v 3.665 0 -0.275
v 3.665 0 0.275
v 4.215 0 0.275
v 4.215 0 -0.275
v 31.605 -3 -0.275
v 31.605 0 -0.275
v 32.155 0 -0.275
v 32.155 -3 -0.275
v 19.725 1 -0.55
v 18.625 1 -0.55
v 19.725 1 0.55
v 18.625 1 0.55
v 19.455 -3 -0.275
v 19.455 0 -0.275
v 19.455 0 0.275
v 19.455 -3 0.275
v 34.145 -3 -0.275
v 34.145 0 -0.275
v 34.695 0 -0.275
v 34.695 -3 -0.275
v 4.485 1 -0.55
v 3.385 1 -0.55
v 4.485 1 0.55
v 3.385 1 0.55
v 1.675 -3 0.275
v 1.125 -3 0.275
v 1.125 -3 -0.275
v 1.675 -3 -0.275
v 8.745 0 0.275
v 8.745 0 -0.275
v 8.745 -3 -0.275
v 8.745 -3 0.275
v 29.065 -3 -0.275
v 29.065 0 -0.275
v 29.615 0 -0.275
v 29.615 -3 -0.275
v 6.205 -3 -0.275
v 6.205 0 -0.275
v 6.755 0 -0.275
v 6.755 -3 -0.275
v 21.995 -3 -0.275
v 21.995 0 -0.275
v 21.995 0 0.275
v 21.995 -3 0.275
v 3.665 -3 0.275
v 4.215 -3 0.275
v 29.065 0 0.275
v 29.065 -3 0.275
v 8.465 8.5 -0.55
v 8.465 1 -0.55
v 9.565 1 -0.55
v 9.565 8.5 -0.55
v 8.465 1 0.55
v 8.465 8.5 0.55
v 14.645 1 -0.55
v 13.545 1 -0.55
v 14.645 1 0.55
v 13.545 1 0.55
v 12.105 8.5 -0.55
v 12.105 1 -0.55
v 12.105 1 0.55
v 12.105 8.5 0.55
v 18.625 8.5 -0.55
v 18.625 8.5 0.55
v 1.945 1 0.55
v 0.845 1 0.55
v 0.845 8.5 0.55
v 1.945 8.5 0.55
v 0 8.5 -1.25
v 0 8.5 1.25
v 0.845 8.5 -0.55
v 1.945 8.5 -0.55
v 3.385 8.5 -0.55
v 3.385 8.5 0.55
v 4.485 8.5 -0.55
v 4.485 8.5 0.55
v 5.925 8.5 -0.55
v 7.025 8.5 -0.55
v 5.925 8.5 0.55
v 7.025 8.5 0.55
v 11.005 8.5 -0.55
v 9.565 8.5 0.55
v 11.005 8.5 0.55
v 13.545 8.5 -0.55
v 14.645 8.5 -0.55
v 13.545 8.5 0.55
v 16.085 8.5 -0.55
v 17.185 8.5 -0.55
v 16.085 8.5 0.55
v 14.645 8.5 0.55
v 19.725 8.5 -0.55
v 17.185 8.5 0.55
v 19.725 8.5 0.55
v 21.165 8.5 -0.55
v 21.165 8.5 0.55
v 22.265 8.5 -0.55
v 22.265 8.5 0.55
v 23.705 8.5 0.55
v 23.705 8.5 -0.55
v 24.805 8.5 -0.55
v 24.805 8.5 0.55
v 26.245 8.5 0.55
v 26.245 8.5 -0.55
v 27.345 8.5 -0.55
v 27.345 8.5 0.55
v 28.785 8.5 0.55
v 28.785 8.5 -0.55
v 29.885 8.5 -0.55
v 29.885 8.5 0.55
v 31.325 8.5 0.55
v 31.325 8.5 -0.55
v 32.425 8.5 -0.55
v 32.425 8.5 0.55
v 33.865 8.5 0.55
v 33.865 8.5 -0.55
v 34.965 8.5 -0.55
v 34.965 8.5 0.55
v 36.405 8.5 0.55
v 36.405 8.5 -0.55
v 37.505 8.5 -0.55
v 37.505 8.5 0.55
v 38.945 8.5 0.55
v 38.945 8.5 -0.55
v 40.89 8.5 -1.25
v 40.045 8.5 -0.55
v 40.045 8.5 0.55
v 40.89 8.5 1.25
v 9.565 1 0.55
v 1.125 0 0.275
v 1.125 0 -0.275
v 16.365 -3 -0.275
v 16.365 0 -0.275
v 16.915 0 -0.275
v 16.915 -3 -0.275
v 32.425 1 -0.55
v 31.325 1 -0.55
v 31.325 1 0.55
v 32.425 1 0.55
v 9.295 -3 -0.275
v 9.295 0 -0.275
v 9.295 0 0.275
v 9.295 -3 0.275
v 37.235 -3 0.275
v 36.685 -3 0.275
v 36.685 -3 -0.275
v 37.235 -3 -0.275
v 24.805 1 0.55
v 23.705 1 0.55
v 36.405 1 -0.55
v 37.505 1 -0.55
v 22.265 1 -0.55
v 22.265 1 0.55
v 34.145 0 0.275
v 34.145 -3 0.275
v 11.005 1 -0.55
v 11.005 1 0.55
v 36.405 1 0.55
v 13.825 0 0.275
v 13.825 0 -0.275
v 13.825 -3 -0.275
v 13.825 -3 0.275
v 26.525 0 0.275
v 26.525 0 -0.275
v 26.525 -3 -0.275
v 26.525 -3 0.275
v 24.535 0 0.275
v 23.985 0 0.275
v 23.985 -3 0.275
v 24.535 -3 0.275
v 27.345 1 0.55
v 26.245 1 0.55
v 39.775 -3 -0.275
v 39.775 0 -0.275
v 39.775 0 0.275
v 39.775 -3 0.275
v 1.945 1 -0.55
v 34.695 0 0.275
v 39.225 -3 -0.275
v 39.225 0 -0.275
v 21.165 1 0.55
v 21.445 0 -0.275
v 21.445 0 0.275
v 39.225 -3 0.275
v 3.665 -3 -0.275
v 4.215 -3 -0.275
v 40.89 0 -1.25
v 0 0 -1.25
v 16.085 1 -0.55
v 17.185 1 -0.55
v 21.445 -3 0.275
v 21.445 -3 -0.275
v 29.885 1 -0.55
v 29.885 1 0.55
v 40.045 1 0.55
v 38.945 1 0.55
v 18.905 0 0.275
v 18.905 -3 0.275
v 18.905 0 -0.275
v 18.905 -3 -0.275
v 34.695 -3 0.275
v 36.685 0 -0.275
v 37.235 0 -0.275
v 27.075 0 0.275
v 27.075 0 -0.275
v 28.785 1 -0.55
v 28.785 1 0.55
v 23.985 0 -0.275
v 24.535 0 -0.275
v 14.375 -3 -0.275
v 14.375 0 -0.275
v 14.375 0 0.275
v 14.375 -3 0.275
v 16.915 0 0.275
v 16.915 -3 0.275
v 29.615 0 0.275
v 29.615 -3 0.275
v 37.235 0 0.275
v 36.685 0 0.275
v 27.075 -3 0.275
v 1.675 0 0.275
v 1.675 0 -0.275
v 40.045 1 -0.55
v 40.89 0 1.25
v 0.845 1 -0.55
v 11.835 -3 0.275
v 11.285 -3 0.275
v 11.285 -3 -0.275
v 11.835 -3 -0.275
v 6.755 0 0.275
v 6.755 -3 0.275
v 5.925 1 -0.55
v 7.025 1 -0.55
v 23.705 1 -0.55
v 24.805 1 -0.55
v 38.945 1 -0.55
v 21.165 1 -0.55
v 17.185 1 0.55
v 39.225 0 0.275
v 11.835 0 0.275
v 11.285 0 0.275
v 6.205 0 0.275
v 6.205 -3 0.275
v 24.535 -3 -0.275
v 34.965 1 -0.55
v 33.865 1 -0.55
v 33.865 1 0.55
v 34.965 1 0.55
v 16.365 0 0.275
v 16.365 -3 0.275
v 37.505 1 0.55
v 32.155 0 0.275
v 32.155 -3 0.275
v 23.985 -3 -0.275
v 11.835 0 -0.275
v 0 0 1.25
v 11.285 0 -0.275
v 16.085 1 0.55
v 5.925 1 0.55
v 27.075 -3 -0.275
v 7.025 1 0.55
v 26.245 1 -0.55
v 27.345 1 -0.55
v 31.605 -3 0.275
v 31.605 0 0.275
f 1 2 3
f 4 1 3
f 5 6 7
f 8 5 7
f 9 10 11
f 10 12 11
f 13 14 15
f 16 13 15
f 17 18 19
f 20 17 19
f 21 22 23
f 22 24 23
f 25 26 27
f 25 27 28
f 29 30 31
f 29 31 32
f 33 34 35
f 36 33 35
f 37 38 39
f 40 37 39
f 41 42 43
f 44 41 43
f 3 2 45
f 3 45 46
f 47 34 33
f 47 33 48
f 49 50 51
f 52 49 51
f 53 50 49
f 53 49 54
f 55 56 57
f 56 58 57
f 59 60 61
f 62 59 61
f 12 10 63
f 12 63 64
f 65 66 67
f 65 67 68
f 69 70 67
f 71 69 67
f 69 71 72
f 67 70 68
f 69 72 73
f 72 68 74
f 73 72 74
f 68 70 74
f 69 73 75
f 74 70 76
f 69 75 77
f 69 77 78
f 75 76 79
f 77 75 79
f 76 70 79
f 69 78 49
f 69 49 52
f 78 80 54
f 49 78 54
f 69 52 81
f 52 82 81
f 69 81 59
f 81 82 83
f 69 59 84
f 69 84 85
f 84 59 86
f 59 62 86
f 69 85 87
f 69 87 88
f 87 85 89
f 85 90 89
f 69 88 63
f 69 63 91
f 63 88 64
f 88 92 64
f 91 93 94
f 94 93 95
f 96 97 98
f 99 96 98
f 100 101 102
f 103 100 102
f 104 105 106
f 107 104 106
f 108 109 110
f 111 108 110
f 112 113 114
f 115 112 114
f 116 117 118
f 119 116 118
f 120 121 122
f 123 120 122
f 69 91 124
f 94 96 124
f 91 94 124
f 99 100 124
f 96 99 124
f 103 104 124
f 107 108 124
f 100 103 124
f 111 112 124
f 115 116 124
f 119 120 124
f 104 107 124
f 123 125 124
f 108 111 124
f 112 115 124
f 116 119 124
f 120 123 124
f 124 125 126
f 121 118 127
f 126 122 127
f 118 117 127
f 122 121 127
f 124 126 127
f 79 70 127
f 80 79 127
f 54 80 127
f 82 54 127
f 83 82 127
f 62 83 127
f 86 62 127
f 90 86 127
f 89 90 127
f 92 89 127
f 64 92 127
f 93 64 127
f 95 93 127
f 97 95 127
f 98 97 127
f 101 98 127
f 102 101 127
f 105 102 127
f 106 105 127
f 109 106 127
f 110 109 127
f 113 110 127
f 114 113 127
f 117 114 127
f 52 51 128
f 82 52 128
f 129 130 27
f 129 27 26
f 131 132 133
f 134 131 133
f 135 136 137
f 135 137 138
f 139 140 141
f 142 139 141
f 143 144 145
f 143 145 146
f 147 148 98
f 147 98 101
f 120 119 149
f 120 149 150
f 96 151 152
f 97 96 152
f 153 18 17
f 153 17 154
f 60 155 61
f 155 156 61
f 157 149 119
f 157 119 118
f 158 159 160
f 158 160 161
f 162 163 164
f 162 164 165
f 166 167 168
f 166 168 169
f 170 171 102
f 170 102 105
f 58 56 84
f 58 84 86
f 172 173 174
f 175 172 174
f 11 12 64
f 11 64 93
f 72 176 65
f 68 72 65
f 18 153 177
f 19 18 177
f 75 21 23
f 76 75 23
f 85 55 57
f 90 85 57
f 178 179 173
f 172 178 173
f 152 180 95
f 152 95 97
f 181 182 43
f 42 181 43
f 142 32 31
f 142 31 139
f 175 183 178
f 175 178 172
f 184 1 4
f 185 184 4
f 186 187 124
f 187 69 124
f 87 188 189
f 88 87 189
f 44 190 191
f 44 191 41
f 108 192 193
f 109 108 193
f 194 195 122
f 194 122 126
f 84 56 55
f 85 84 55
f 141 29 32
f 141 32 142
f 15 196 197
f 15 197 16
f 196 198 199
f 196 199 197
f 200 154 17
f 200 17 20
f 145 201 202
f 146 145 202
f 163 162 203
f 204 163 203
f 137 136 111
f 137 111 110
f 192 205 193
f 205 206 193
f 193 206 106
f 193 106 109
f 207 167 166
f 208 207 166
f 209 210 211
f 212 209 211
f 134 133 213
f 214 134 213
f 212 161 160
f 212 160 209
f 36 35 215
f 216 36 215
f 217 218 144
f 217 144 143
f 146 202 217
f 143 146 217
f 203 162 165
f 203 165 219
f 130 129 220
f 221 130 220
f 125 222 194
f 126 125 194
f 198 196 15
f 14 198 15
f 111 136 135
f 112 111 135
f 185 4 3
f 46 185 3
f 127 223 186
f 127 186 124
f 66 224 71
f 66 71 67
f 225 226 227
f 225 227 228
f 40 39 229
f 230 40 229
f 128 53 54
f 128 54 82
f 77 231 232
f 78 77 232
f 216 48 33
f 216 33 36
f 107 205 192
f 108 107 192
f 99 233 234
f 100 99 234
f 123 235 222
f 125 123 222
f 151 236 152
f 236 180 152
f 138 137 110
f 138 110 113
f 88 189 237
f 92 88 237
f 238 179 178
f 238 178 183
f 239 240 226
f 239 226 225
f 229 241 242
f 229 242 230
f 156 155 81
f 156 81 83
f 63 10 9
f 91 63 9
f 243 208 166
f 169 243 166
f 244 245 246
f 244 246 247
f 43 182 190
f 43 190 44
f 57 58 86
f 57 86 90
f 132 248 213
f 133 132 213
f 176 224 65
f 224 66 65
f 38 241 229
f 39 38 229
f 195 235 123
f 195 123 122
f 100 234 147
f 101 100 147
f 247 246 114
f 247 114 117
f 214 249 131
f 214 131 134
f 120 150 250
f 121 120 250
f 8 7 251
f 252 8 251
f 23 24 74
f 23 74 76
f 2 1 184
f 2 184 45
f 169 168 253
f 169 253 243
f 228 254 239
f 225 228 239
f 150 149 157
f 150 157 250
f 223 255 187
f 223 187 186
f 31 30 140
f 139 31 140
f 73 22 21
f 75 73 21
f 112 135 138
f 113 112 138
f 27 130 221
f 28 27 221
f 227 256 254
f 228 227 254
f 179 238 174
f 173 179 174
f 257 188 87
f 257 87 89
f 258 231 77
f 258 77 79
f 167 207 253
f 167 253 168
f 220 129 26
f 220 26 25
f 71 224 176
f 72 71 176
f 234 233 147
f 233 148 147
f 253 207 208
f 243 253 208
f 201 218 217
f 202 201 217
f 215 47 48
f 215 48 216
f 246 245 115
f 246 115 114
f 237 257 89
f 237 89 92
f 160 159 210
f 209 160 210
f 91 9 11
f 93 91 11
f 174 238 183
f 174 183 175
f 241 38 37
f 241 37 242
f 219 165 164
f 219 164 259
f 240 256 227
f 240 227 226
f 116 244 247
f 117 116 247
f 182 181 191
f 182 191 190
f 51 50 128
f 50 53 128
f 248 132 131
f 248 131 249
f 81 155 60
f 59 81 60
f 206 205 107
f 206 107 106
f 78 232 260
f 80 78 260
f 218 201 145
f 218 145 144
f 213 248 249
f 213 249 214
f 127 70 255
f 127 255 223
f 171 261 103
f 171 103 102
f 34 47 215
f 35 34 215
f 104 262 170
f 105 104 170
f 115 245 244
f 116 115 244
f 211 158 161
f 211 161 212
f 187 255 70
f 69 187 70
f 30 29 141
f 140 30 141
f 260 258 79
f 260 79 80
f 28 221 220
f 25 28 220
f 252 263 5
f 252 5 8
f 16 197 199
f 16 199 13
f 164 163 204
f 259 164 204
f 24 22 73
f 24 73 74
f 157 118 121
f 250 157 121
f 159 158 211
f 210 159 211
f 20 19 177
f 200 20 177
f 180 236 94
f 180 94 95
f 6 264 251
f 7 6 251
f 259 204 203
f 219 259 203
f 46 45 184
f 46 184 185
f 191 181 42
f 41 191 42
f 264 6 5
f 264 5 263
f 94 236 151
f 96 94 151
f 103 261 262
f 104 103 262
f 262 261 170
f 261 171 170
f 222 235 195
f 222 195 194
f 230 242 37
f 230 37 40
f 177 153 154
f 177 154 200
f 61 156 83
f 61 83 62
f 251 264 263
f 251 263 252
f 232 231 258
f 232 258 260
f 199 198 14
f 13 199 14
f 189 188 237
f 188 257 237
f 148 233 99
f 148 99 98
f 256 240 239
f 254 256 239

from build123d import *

# Parameters (mm, degrees)
SKETCH1_W              = 40.89
SKETCH1_H              = 8.5
BOSS_EXTRUDE1_DEPTH    = 1.25
SKETCH2_W              = 1.1
SKETCH2_H              = 1.1
CUT_EXTRUDE1_DEPTH     = 9.5
SKETCH3_W              = 40.89
SKETCH3_H              = 2.5
BOSS_EXTRUDE2_DEPTH    = 1
SKETCH4_W              = 0.55
SKETCH4_H              = 0.55
BOSS_EXTRUDE3_DEPTH    = 3
BOSS_EXTRUDE3_2_DEPTH  = 3
BOSS_EXTRUDE3_3_DEPTH  = 3
BOSS_EXTRUDE3_4_DEPTH  = 3
BOSS_EXTRUDE3_5_DEPTH  = 3
BOSS_EXTRUDE3_6_DEPTH  = 3
BOSS_EXTRUDE3_7_DEPTH  = 3
BOSS_EXTRUDE3_8_DEPTH  = 3
BOSS_EXTRUDE3_9_DEPTH  = 3
BOSS_EXTRUDE3_10_DEPTH = 3
BOSS_EXTRUDE3_11_DEPTH = 3
BOSS_EXTRUDE3_12_DEPTH = 3
BOSS_EXTRUDE3_13_DEPTH = 3
BOSS_EXTRUDE3_14_DEPTH = 3
BOSS_EXTRUDE3_15_DEPTH = 3
BOSS_EXTRUDE3_16_DEPTH = 3


with BuildPart() as part:
    # Sketch1 → Boss-Extrude1 (new body, symmetric)
    with BuildSketch(Plane.XY):
        with Locations((20.445, 4.25)):
            Rectangle(SKETCH1_W, SKETCH1_H)
    extrude(amount=BOSS_EXTRUDE1_DEPTH, both=True)

    # Sketch2 → Cut-Extrude1 (cut, through all)
    with BuildSketch(Plane.XZ):
        with Locations((3.935, 0)):
            Rectangle(SKETCH2_W, SKETCH2_H)
        with Locations((1.395, 0)):
            Rectangle(SKETCH2_W, SKETCH2_H)
        with Locations((6.475, 0)):
            Rectangle(SKETCH2_W, SKETCH2_H)
        with Locations((9.015, 0)):
            Rectangle(SKETCH2_W, SKETCH2_H)
        with Locations((11.555, 0)):
            Rectangle(SKETCH2_W, SKETCH2_H)
        with Locations((14.095, 0)):
            Rectangle(SKETCH2_W, SKETCH2_H)
        with Locations((16.635, 0)):
            Rectangle(SKETCH2_W, SKETCH2_H)
        with Locations((19.175, 0)):
            Rectangle(SKETCH2_W, SKETCH2_H)
        with Locations((21.715, 0)):
            Rectangle(SKETCH2_W, SKETCH2_H)
        with Locations((24.255, 0)):
            Rectangle(SKETCH2_W, SKETCH2_H)
        with Locations((26.795, 0)):
            Rectangle(SKETCH2_W, SKETCH2_H)
        with Locations((29.335, 0)):
            Rectangle(SKETCH2_W, SKETCH2_H)
        with Locations((31.875, 0)):
            Rectangle(SKETCH2_W, SKETCH2_H)
        with Locations((34.415, 0)):
            Rectangle(SKETCH2_W, SKETCH2_H)
        with Locations((36.955, 0)):
            Rectangle(SKETCH2_W, SKETCH2_H)
        with Locations((39.495, 0)):
            Rectangle(SKETCH2_W, SKETCH2_H)
    extrude(amount=-CUT_EXTRUDE1_DEPTH, mode=Mode.SUBTRACT)

    # Sketch3 → Boss-Extrude2 (add)
    with BuildSketch(Plane.XZ):
        with Locations((20.445, 0)):
            Rectangle(SKETCH3_W, SKETCH3_H)
    extrude(amount=-BOSS_EXTRUDE2_DEPTH)


with BuildPart() as body_2:
    # Sketch4 → Boss-Extrude3 (new body)
    with BuildSketch(Plane.XZ):
        with Locations((1.4, 0)):
            Rectangle(SKETCH4_W, SKETCH4_H)
    extrude(amount=BOSS_EXTRUDE3_DEPTH)


with BuildPart() as body_3:
    # Sketch4 → Boss-Extrude3 2 (new body)
    with BuildSketch(Plane.XZ):
        with Locations((3.94, 0)):
            Rectangle(SKETCH4_W, SKETCH4_H)
    extrude(amount=BOSS_EXTRUDE3_2_DEPTH)


with BuildPart() as body_4:
    # Sketch4 → Boss-Extrude3 3 (new body)
    with BuildSketch(Plane.XZ):
        with Locations((6.48, 0)):
            Rectangle(SKETCH4_W, SKETCH4_H)
    extrude(amount=BOSS_EXTRUDE3_3_DEPTH)


with BuildPart() as body_5:
    # Sketch4 → Boss-Extrude3 4 (new body)
    with BuildSketch(Plane.XZ):
        with Locations((9.02, 0)):
            Rectangle(SKETCH4_W, SKETCH4_H)
    extrude(amount=BOSS_EXTRUDE3_4_DEPTH)


with BuildPart() as body_6:
    # Sketch4 → Boss-Extrude3 5 (new body)
    with BuildSketch(Plane.XZ):
        with Locations((11.56, 0)):
            Rectangle(SKETCH4_W, SKETCH4_H)
    extrude(amount=BOSS_EXTRUDE3_5_DEPTH)


with BuildPart() as body_7:
    # Sketch4 → Boss-Extrude3 6 (new body)
    with BuildSketch(Plane.XZ):
        with Locations((14.1, 0)):
            Rectangle(SKETCH4_W, SKETCH4_H)
    extrude(amount=BOSS_EXTRUDE3_6_DEPTH)


with BuildPart() as body_8:
    # Sketch4 → Boss-Extrude3 7 (new body)
    with BuildSketch(Plane.XZ):
        with Locations((16.64, 0)):
            Rectangle(SKETCH4_W, SKETCH4_H)
    extrude(amount=BOSS_EXTRUDE3_7_DEPTH)


with BuildPart() as body_9:
    # Sketch4 → Boss-Extrude3 8 (new body)
    with BuildSketch(Plane.XZ):
        with Locations((19.18, 0)):
            Rectangle(SKETCH4_W, SKETCH4_H)
    extrude(amount=BOSS_EXTRUDE3_8_DEPTH)


with BuildPart() as body_10:
    # Sketch4 → Boss-Extrude3 9 (new body)
    with BuildSketch(Plane.XZ):
        with Locations((21.72, 0)):
            Rectangle(SKETCH4_W, SKETCH4_H)
    extrude(amount=BOSS_EXTRUDE3_9_DEPTH)


with BuildPart() as body_11:
    # Sketch4 → Boss-Extrude3 10 (new body)
    with BuildSketch(Plane.XZ):
        with Locations((24.26, 0)):
            Rectangle(SKETCH4_W, SKETCH4_H)
    extrude(amount=BOSS_EXTRUDE3_10_DEPTH)


with BuildPart() as body_12:
    # Sketch4 → Boss-Extrude3 11 (new body)
    with BuildSketch(Plane.XZ):
        with Locations((26.8, 0)):
            Rectangle(SKETCH4_W, SKETCH4_H)
    extrude(amount=BOSS_EXTRUDE3_11_DEPTH)


with BuildPart() as body_13:
    # Sketch4 → Boss-Extrude3 12 (new body)
    with BuildSketch(Plane.XZ):
        with Locations((29.34, 0)):
            Rectangle(SKETCH4_W, SKETCH4_H)
    extrude(amount=BOSS_EXTRUDE3_12_DEPTH)


with BuildPart() as body_14:
    # Sketch4 → Boss-Extrude3 13 (new body)
    with BuildSketch(Plane.XZ):
        with Locations((31.88, 0)):
            Rectangle(SKETCH4_W, SKETCH4_H)
    extrude(amount=BOSS_EXTRUDE3_13_DEPTH)


with BuildPart() as body_15:
    # Sketch4 → Boss-Extrude3 14 (new body)
    with BuildSketch(Plane.XZ):
        with Locations((34.42, 0)):
            Rectangle(SKETCH4_W, SKETCH4_H)
    extrude(amount=BOSS_EXTRUDE3_14_DEPTH)


with BuildPart() as body_16:
    # Sketch4 → Boss-Extrude3 15 (new body)
    with BuildSketch(Plane.XZ):
        with Locations((36.96, 0)):
            Rectangle(SKETCH4_W, SKETCH4_H)
    extrude(amount=BOSS_EXTRUDE3_15_DEPTH)


with BuildPart() as body_17:
    # Sketch4 → Boss-Extrude3 16 (new body)
    with BuildSketch(Plane.XZ):
        with Locations((39.5, 0)):
            Rectangle(SKETCH4_W, SKETCH4_H)
    extrude(amount=BOSS_EXTRUDE3_16_DEPTH)


solid = Compound([part.part, body_2.part, body_3.part, body_4.part, body_5.part, body_6.part, body_7.part, body_8.part, body_9.part, body_10.part, body_11.part, body_12.part, body_13.part, body_14.part, body_15.part, body_16.part, body_17.part])
